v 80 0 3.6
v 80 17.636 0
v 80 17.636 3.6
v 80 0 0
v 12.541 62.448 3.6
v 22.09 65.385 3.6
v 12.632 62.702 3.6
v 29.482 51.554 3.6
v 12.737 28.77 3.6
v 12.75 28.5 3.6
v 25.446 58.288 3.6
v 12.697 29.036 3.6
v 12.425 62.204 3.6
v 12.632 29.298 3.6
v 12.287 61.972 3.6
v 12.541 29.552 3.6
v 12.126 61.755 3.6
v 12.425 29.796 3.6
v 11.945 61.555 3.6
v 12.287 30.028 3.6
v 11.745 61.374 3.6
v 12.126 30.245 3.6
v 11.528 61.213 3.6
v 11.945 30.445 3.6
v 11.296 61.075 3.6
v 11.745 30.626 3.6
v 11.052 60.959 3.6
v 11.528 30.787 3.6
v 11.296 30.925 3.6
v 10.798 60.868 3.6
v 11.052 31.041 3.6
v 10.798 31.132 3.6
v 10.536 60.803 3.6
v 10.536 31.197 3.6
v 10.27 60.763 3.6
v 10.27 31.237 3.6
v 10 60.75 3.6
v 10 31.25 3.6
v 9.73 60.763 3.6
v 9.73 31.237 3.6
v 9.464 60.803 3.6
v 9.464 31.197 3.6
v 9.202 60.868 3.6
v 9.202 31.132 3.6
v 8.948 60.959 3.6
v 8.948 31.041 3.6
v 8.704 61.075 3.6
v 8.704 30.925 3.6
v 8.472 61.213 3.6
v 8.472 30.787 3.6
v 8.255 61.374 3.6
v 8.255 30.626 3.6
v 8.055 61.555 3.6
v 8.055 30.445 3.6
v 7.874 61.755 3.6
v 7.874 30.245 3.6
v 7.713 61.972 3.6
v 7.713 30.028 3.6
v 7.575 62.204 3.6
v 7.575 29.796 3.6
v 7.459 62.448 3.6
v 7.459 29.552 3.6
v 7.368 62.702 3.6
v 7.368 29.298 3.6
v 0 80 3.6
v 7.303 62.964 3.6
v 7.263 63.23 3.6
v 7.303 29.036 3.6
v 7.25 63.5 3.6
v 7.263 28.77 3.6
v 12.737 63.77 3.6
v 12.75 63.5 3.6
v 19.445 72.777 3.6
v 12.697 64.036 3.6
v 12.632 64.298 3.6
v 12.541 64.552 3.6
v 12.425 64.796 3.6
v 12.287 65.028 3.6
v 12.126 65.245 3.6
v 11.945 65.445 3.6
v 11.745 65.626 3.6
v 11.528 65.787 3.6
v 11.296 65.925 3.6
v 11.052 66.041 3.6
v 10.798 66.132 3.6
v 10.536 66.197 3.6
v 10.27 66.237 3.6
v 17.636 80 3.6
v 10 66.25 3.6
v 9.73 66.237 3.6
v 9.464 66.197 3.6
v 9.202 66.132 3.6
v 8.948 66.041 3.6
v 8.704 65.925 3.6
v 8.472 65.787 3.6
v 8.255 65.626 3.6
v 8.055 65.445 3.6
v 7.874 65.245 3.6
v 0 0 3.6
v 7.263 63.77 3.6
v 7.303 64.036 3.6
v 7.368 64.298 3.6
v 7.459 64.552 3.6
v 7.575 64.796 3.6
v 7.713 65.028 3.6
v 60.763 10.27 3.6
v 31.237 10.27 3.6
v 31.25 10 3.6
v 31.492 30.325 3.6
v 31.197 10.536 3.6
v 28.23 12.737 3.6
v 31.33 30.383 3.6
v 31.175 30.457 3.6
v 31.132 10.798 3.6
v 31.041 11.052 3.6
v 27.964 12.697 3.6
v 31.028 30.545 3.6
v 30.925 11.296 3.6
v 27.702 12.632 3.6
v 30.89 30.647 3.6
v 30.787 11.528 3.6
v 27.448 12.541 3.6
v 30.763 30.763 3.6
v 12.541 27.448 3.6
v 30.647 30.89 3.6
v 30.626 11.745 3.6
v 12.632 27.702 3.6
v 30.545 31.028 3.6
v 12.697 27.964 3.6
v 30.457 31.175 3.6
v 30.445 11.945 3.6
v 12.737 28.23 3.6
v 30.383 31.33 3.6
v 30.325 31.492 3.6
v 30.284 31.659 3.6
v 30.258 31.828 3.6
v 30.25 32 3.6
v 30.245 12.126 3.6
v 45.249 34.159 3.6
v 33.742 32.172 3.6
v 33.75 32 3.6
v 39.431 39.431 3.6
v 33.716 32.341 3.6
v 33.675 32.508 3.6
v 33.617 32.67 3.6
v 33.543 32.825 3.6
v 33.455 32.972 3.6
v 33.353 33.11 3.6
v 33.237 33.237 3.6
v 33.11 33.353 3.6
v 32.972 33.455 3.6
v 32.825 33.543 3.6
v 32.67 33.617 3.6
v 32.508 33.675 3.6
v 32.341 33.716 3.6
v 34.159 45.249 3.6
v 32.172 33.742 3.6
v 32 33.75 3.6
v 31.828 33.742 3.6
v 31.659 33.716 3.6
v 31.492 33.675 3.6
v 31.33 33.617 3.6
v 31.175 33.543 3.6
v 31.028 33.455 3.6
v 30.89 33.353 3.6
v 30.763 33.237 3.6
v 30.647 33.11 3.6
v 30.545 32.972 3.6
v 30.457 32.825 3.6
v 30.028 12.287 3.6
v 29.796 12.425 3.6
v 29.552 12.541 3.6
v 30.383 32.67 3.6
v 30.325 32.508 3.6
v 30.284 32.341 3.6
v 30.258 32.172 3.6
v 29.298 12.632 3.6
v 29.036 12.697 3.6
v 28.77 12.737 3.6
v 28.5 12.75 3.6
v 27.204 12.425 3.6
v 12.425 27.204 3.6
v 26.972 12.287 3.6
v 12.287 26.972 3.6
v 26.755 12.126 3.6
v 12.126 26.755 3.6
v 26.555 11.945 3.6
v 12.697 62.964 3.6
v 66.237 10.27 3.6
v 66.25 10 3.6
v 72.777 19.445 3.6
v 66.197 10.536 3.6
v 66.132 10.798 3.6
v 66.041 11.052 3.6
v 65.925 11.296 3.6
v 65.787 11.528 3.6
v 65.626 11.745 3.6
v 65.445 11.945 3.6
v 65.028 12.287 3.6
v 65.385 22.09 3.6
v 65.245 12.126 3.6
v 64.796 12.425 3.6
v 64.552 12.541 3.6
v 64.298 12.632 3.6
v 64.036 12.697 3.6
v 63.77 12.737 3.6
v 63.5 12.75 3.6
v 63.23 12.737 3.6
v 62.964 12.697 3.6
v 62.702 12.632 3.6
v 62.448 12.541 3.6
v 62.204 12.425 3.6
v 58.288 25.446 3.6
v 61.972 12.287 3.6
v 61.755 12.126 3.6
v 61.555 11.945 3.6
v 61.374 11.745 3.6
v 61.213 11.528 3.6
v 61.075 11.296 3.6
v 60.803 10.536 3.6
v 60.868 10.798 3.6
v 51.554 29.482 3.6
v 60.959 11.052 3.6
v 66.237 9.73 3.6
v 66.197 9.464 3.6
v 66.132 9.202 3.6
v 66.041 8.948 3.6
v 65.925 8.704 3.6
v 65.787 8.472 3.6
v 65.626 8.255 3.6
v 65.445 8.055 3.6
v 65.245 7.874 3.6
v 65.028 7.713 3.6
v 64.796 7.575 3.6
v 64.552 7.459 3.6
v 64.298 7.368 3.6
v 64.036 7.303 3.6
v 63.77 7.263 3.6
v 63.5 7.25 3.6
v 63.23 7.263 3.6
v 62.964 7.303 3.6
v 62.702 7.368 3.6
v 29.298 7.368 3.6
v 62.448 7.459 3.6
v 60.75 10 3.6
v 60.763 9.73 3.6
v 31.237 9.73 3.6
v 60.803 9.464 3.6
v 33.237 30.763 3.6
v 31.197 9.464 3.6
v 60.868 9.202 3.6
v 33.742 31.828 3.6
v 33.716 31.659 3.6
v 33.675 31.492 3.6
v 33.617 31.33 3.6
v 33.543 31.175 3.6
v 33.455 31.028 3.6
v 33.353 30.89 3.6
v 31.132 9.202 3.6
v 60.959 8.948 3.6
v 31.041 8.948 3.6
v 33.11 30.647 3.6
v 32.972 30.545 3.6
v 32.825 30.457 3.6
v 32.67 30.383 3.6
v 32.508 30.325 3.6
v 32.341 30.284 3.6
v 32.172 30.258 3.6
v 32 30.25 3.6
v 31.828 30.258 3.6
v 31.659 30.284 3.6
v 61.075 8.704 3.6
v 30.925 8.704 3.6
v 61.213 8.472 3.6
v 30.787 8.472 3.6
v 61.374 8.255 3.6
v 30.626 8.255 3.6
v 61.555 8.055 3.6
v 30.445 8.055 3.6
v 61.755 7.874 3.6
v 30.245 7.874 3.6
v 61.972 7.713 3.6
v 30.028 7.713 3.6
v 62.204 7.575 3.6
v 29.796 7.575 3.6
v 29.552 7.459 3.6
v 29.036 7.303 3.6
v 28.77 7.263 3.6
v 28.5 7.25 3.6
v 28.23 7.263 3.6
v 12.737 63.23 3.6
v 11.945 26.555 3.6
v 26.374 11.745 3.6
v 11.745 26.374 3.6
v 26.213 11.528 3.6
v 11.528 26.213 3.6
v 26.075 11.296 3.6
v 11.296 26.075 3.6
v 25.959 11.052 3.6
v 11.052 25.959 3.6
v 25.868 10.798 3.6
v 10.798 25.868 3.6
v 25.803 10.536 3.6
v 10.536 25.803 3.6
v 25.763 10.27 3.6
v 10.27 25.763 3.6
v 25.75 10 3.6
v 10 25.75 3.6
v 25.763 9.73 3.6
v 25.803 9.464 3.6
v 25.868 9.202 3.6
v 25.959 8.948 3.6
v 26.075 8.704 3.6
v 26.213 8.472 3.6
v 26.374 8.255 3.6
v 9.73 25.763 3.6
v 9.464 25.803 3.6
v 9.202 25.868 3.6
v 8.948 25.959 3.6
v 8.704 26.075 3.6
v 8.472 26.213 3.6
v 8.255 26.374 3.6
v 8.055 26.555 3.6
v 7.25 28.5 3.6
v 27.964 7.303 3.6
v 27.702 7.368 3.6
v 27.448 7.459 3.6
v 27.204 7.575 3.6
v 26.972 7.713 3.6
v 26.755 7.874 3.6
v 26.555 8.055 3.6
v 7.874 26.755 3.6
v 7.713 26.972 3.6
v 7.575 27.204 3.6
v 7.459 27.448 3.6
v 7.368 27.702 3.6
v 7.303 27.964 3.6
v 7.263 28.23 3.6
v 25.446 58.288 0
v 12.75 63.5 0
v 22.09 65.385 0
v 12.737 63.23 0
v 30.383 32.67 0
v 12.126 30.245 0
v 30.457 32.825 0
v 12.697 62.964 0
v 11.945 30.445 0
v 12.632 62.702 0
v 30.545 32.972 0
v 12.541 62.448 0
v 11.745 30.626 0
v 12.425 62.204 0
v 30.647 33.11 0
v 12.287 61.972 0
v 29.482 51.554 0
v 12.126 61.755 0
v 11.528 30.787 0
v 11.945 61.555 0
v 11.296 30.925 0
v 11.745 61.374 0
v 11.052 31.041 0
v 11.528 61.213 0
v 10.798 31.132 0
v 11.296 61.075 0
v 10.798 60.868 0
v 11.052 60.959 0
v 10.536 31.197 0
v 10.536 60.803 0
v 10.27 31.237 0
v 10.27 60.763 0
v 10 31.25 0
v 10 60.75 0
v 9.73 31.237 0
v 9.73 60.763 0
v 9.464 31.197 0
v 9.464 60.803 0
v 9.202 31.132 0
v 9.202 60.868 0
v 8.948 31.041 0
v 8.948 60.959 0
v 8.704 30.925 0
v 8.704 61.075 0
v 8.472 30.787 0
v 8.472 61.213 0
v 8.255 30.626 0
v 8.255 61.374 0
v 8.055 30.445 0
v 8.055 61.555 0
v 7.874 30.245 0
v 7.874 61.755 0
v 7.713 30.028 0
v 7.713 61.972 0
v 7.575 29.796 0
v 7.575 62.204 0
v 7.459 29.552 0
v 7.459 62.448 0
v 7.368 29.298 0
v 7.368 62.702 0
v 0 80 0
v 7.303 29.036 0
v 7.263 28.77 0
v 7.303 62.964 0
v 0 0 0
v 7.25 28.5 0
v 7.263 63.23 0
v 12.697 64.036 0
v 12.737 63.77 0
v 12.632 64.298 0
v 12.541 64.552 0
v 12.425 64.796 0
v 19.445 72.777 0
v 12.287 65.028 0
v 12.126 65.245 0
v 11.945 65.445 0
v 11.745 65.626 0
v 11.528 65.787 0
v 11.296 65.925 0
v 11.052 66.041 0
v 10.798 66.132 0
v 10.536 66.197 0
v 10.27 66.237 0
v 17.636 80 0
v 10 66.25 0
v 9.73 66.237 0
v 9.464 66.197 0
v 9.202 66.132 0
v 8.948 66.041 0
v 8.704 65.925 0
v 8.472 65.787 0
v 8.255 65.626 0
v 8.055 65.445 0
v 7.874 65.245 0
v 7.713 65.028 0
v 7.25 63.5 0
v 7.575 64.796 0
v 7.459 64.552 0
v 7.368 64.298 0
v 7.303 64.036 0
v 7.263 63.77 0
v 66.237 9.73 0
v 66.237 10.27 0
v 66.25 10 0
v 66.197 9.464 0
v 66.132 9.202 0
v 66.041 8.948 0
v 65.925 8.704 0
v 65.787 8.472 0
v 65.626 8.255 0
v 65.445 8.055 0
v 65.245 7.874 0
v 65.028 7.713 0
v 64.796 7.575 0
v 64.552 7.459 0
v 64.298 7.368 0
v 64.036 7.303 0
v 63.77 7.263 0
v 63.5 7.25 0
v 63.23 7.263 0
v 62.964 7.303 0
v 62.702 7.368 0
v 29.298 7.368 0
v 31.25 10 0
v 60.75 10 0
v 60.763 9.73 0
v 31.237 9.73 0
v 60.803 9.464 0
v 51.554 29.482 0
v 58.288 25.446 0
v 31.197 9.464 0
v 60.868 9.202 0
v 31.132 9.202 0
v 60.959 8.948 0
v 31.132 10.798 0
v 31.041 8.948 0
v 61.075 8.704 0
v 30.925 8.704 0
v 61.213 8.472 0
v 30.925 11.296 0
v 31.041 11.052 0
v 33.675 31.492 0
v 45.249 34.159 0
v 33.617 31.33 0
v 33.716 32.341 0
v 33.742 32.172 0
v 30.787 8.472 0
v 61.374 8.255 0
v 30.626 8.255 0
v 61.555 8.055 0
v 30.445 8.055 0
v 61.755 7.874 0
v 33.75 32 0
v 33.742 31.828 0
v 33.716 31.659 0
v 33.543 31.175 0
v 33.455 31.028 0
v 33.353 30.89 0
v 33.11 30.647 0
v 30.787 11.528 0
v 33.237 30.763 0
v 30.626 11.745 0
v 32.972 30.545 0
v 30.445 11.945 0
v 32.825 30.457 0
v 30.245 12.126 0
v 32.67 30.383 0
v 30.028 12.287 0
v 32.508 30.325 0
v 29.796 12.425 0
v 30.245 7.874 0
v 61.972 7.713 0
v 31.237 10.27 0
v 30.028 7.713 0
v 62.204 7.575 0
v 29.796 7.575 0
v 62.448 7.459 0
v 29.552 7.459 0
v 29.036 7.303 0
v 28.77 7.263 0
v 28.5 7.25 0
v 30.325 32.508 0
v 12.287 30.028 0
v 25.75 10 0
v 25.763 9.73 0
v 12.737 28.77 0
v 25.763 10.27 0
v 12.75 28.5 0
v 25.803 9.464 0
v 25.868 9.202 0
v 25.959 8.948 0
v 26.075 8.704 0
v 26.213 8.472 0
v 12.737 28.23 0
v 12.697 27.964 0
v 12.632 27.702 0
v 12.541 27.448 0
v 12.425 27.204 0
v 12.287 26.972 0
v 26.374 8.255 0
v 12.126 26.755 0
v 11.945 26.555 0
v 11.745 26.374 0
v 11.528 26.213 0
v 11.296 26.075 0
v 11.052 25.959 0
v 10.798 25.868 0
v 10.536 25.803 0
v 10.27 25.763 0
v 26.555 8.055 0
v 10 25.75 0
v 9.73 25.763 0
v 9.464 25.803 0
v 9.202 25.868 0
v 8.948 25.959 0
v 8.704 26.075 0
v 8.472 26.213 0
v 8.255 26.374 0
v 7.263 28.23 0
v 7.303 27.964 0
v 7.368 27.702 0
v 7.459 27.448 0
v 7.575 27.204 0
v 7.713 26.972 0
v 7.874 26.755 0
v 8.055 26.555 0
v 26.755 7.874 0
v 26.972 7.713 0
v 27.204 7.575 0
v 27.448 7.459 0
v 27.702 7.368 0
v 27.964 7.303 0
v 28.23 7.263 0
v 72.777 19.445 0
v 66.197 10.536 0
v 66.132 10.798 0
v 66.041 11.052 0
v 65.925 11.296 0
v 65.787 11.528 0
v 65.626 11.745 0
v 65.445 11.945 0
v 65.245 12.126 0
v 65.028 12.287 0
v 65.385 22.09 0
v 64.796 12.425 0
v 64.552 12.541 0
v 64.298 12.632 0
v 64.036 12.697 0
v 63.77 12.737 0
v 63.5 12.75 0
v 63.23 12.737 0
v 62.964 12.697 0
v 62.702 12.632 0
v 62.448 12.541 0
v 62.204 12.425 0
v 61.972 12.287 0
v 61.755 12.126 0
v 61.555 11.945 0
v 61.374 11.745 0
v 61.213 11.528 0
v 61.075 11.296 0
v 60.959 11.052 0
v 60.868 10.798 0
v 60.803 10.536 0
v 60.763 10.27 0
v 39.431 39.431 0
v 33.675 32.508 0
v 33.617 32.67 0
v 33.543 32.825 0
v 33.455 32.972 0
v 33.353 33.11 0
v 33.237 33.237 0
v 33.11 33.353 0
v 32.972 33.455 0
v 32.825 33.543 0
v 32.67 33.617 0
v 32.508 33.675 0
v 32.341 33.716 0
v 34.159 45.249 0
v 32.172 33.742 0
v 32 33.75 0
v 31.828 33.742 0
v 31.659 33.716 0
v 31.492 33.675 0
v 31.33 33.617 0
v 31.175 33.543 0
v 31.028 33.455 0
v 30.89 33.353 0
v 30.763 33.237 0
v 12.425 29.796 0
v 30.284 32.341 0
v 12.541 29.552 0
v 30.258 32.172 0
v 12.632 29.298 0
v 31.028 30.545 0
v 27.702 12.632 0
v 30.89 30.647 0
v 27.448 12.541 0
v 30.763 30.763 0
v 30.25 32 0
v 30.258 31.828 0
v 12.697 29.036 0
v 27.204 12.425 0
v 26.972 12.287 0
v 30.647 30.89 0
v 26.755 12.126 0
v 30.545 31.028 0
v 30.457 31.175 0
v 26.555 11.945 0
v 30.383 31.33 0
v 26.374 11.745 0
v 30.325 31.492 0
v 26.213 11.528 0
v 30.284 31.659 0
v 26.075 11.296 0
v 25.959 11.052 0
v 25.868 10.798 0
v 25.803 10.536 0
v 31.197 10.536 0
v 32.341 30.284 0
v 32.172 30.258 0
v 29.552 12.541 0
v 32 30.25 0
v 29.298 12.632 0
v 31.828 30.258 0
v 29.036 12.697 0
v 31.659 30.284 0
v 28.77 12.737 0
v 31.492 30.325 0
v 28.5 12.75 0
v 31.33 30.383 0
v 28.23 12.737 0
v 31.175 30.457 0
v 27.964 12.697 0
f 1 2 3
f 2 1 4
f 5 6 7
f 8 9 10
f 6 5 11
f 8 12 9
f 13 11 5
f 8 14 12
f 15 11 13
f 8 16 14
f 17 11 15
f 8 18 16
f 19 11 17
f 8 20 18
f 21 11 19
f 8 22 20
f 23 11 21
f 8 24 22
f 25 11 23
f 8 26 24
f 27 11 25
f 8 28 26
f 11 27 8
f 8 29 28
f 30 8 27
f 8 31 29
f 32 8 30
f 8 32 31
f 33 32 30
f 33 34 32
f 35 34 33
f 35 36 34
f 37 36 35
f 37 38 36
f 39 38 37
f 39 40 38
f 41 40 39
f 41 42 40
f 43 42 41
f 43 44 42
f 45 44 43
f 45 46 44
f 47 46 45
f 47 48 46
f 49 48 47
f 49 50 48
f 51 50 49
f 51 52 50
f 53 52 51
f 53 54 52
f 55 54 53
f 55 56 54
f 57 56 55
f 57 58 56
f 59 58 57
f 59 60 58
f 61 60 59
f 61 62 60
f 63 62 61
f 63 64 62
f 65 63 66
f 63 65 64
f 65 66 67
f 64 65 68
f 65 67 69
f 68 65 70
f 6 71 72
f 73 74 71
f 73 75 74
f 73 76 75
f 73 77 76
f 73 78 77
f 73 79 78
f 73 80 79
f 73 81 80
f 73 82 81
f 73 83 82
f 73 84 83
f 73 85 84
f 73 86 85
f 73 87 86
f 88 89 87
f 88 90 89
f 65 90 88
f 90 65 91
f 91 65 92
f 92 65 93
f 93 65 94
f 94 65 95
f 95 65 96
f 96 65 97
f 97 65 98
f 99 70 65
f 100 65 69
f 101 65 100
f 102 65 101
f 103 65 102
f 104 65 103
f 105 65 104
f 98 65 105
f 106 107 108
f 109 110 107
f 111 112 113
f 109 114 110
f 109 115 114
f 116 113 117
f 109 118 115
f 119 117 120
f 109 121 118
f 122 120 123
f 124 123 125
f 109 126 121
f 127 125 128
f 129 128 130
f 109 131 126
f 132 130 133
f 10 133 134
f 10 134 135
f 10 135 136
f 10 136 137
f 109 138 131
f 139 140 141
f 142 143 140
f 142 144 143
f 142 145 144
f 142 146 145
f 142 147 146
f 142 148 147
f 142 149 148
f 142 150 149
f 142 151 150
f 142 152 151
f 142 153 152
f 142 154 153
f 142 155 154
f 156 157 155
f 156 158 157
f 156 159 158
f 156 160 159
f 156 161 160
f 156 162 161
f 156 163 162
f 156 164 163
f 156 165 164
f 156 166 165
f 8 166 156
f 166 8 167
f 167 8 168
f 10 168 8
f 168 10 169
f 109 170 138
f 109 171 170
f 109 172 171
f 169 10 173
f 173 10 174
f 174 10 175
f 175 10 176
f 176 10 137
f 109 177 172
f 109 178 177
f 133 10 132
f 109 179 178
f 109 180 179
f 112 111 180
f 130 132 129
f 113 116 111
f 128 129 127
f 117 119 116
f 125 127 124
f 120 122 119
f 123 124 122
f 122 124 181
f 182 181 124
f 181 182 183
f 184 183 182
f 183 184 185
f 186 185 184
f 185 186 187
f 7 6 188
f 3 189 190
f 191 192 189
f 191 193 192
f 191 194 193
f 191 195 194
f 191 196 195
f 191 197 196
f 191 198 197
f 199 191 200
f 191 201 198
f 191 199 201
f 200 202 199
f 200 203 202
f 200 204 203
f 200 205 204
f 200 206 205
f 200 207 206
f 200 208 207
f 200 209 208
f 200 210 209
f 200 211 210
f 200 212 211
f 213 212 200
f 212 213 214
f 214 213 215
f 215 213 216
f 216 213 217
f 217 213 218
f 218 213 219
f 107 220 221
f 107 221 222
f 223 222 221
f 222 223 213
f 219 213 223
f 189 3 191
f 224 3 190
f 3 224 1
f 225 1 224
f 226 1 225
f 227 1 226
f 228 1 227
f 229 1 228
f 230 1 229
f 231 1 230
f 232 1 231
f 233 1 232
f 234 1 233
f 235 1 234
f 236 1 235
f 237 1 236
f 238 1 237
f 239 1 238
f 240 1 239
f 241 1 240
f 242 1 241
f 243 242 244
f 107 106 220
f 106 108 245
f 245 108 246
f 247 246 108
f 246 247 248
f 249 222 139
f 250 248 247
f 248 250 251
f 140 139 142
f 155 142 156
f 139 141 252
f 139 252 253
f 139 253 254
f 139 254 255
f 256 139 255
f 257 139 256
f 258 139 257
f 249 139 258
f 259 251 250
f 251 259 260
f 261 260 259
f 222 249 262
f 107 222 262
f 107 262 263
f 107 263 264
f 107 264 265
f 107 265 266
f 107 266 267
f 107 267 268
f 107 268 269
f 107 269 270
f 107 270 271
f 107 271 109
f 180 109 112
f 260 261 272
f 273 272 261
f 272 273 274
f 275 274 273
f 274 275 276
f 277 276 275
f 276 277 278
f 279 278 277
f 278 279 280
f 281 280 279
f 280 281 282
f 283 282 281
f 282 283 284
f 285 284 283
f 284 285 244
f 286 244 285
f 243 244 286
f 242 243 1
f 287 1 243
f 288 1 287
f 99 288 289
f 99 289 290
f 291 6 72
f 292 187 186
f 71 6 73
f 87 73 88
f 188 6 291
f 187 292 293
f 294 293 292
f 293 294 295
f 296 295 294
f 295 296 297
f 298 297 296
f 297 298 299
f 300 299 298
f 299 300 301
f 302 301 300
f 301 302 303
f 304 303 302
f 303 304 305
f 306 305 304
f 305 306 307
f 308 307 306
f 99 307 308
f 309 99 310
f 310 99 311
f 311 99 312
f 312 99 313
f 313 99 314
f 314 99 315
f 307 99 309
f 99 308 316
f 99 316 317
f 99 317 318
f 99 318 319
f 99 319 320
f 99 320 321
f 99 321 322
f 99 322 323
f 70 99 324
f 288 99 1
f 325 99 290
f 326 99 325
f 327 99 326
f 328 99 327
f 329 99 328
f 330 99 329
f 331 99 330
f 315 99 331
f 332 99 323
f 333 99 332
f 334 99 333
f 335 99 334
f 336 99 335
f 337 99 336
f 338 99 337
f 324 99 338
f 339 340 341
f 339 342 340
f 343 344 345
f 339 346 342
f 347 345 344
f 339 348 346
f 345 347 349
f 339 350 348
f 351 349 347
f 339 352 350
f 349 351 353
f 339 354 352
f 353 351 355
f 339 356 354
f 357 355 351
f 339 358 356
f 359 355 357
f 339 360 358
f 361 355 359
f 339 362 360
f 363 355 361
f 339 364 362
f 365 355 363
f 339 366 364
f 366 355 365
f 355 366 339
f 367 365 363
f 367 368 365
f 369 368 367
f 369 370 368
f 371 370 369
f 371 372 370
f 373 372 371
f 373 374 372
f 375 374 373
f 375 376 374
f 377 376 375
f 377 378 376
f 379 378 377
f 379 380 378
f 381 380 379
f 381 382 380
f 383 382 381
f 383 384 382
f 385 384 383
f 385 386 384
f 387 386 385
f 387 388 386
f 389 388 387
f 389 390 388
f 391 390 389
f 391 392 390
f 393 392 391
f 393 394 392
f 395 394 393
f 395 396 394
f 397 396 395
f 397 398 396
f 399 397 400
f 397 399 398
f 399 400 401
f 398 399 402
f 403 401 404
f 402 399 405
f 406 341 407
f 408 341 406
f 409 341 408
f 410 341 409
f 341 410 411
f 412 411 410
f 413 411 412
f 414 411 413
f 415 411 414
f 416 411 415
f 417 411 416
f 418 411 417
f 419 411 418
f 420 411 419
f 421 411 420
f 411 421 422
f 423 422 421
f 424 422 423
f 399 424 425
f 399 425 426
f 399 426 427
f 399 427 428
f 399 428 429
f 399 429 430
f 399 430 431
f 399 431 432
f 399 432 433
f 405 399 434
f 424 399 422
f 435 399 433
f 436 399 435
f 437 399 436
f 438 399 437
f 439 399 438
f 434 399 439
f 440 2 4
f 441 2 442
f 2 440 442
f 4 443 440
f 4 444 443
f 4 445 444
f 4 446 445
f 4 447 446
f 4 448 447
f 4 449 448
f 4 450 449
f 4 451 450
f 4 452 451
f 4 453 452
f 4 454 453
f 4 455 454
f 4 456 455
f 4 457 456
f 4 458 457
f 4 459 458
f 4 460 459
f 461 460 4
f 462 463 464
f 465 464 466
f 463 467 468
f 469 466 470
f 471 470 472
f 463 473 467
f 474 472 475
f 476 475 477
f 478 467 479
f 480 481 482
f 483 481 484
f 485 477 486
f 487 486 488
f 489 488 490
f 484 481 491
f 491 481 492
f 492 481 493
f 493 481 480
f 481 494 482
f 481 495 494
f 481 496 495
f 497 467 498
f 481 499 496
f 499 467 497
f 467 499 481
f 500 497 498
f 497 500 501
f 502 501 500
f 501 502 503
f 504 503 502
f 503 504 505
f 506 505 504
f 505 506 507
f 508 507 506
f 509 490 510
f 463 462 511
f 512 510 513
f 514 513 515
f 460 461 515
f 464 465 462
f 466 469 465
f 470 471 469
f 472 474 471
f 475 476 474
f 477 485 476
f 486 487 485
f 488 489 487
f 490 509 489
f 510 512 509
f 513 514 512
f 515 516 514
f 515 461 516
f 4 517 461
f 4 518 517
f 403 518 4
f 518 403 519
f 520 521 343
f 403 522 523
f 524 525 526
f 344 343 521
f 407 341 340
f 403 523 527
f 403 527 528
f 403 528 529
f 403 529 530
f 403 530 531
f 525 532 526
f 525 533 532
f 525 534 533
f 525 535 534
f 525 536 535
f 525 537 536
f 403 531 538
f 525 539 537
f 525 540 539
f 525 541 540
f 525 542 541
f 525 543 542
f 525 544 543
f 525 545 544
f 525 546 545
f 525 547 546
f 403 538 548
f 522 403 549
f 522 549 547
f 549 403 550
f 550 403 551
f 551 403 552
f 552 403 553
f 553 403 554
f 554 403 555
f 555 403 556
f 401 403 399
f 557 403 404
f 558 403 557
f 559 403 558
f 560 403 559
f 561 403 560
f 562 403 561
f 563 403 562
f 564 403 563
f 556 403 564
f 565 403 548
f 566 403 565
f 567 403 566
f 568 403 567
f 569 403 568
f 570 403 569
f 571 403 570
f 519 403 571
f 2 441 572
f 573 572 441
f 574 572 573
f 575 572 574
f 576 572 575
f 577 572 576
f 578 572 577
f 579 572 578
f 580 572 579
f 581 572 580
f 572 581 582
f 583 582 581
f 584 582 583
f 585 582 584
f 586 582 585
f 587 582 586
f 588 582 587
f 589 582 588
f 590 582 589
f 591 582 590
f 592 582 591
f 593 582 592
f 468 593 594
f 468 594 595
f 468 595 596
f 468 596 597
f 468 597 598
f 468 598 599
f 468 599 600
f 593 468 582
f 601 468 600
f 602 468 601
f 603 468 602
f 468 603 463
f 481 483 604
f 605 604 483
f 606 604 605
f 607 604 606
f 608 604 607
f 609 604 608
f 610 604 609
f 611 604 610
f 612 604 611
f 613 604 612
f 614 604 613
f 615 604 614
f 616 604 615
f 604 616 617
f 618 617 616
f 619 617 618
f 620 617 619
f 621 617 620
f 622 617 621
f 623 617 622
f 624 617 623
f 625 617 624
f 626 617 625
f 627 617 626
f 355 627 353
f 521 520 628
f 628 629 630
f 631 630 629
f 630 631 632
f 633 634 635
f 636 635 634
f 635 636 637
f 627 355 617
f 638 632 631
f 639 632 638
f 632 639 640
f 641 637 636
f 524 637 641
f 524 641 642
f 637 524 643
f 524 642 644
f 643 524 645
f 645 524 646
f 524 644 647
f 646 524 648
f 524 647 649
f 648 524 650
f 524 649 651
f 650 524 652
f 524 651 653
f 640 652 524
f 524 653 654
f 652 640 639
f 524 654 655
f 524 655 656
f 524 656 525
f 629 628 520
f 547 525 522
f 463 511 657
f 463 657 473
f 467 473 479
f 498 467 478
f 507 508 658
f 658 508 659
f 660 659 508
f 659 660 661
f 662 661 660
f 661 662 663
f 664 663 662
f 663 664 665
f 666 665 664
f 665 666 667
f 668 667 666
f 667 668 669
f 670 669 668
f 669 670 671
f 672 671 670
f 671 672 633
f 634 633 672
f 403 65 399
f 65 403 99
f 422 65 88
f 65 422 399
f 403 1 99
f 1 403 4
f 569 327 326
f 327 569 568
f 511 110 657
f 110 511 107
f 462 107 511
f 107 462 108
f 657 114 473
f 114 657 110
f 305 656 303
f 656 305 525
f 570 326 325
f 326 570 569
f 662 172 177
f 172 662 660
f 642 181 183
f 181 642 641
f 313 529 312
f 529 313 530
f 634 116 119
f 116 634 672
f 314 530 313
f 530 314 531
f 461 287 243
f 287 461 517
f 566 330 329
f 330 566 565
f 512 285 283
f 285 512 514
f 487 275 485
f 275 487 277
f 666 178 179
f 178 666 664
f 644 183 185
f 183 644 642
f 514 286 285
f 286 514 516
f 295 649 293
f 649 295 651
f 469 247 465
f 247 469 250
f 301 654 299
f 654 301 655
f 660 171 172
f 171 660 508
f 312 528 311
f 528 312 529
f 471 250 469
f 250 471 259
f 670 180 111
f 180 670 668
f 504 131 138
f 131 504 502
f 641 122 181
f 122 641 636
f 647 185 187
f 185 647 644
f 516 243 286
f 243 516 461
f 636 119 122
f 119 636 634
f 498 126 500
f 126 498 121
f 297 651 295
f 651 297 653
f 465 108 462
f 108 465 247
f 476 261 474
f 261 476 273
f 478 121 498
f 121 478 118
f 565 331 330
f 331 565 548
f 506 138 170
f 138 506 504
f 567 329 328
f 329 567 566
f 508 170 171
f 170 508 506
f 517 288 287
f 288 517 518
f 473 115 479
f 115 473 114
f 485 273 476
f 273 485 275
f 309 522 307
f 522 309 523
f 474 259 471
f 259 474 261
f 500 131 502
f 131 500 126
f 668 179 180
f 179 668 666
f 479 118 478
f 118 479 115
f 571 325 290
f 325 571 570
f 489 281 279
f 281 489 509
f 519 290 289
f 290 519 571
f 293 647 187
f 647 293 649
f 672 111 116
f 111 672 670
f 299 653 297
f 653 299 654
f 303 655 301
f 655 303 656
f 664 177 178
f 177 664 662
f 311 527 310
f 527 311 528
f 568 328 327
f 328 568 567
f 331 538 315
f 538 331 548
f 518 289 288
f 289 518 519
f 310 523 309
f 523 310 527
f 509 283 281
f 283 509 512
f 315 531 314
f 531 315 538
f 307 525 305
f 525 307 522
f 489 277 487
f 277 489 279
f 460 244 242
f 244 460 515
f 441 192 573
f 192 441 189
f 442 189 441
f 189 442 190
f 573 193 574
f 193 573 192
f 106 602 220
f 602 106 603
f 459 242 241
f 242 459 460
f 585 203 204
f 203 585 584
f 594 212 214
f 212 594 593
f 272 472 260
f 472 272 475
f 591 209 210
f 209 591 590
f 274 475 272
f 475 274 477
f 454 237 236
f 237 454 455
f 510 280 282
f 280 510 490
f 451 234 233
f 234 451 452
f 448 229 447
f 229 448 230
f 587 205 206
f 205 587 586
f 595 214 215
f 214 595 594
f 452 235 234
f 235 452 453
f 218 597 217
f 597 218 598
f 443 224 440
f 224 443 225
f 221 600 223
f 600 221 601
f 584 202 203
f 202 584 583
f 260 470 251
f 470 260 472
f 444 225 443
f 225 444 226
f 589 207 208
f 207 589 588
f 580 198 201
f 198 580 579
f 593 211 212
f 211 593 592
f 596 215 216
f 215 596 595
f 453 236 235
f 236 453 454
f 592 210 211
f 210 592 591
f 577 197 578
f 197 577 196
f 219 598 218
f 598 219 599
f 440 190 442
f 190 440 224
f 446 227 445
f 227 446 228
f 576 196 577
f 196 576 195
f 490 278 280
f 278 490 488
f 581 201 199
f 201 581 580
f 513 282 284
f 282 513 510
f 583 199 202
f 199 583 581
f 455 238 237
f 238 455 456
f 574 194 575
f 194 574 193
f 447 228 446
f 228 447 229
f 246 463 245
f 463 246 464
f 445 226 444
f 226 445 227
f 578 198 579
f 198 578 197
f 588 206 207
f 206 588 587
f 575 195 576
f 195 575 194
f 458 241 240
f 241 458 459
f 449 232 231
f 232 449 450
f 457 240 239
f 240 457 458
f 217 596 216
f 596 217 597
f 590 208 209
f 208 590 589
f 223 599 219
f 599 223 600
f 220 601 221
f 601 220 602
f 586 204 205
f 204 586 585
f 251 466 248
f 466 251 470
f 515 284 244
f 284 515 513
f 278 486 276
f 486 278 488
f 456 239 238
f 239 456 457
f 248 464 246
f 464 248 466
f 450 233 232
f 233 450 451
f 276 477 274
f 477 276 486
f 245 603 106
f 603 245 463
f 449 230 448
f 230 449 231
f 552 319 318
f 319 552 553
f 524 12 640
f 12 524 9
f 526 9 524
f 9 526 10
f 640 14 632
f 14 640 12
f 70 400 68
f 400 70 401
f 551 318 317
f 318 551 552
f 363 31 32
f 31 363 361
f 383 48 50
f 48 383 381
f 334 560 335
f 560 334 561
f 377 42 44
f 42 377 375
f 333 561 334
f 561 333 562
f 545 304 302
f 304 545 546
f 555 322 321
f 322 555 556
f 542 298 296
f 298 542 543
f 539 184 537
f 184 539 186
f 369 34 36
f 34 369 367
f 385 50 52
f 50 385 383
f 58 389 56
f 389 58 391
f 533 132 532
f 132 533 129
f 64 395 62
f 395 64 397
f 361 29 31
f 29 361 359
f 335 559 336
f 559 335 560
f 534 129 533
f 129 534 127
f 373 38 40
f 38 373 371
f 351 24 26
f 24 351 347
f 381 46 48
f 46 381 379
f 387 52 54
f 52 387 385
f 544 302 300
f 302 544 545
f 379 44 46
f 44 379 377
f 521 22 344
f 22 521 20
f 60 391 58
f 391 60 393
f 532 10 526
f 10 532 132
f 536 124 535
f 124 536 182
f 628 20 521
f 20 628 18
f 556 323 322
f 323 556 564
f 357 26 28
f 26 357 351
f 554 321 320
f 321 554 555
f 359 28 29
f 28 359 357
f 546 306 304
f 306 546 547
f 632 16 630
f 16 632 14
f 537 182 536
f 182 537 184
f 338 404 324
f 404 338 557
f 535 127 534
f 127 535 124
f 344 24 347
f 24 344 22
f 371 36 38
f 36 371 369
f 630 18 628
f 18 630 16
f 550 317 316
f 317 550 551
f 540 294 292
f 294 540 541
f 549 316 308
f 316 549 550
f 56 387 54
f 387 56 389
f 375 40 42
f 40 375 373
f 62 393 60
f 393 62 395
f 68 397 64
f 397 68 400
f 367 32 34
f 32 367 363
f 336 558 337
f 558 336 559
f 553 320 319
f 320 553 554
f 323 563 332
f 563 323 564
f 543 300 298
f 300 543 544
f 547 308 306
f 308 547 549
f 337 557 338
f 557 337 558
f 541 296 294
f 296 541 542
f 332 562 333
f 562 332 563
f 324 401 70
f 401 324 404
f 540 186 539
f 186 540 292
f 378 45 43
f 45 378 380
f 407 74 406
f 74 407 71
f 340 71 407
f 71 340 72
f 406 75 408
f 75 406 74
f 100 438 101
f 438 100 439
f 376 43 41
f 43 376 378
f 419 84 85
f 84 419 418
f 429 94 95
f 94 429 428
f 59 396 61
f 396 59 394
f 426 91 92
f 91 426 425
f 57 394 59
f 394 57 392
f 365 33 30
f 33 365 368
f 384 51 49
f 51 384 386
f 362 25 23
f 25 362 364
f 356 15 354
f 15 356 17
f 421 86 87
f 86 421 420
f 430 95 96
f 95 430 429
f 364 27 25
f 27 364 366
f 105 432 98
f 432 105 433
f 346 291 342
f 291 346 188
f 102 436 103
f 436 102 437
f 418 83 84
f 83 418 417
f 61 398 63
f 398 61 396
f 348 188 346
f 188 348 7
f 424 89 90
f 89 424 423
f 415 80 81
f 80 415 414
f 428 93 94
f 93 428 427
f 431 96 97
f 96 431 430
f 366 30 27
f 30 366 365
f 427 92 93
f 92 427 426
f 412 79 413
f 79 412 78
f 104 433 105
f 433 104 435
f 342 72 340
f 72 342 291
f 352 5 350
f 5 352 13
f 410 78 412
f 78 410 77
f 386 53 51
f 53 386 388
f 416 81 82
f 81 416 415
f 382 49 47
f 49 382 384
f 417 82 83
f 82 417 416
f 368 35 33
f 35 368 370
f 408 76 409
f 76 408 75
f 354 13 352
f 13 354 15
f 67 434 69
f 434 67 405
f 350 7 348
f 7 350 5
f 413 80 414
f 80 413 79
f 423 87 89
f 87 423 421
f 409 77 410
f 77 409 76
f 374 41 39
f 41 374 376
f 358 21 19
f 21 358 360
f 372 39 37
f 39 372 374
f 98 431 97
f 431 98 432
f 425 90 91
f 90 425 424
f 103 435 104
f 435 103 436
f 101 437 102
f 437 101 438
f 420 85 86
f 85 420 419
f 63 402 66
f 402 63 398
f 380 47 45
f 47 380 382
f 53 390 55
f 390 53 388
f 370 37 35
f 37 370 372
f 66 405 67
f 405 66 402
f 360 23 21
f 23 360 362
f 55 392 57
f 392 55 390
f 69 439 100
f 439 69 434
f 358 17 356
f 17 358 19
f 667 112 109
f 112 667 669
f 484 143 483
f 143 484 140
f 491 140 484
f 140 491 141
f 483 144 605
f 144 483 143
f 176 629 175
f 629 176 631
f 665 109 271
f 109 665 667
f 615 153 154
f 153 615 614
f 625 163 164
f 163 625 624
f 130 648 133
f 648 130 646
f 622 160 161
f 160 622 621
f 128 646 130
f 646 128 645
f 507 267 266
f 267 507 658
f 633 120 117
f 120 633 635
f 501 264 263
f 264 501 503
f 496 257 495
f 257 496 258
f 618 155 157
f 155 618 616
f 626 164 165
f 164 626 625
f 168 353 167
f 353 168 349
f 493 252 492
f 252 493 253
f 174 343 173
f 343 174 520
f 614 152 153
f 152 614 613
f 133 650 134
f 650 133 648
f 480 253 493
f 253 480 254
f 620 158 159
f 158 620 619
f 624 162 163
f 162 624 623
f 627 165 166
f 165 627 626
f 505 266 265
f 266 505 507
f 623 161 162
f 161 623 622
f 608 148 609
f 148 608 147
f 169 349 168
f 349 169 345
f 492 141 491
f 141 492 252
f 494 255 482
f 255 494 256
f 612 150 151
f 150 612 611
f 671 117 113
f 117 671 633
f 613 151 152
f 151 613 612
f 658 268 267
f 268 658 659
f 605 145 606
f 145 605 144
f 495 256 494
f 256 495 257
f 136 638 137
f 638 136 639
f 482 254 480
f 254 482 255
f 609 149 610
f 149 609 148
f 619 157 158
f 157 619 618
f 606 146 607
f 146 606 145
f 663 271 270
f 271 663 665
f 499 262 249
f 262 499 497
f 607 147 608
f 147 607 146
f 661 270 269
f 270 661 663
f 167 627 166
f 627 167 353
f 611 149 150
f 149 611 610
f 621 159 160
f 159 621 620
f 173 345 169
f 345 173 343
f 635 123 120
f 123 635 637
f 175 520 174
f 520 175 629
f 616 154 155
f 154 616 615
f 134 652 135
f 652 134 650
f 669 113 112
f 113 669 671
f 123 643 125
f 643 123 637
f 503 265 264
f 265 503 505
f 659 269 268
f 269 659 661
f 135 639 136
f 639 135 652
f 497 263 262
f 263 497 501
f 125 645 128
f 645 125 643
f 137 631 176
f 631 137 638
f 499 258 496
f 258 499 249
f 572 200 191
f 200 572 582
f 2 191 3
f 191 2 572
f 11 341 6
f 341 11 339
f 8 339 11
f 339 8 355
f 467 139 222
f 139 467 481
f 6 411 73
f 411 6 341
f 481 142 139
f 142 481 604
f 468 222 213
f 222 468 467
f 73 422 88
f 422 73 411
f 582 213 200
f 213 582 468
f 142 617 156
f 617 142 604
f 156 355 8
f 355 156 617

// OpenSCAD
// file: ../sc.scad
// ShortCuts.scad 
// Autor: Rudolf Huttary, Berlin 2015
//
$fn = 100; 

//show_examples(); 

module show_examples()
	place_in_rect(30, 30)
	{
		Cy(h = 10); 
		CyH(h = 10); 
		CyH(h = 10, w = 30); 
		CyS(h = 10); 
		CyS(h = 10, w1 = 25, w2 = 75); 
		Cu(10); 
		Ri(h = 10); 
		RiH(h = 10); 
		RiS(h = 10, w1 = 10); 
		RiS(h = 10, w1 = 30, w2 = 300); 
		Sp(); 
		SpH(10, 30, 30); 
	}


module help()
{
echo("==============="); 
echo("help(): shows this help"); 
echo("show_examples(): shows some examples"); 
echo("place_in_rect(): places children objects in grid"); 
echo("Transformations:"); 
echo(" transform :  T(x=0, y=0, z=0), Tx(x=0) , Ty(y=0), Tz(z=0)"); 
echo(" rotate :  R(x=0, y=0, z=0), Rx(x=0) , Ry(y=0), Rz(z=0)"); 
echo(" scale :  S(x=1, y=1, z=1), Sx(x=1) , Sy(y=1), Sz(z=1)"); 
echo("Logical"); 
echo(" difference :  D()"); 
echo(" union :  U()"); 
echo(" intersection : *missing*"); 
echo("Primitives"); 
echo(" circle :  Ci(r=10)"); 
echo(" circle_half :  CiH(r=10, w=0)")
echo(" circle_segment :  CiS(r=10, w1=0, w2=90)")
echo(" square :  Sq(x=10, y=0, center=true))"); 
echo(" cylinder :  Cy(r=10, h=1, center=true)"); 
echo(" cylinder_half :  CyH(r=10, w=0)")
echo(" cylinder_segment: CyS(r=10, h=1, w1=0, w2=90,center=true)"); 
echo(" cylinder_segment: Pie(r=10, h=1, w1=0, w2=90,center=true)"); 
echo(" cube :  Cu(x=10, y=0, z=10, center=true)"); 
echo(" ring :  Ri(R=10, r=5, h=1, center=true)"); 
echo(" ring_half :  RiH(R=10, r=5, h=1, w=0 center=true)"); 
echo(" ring_segment :  RiS(R=10, r=5, h=1, w1=0, w2=90, center=true)"); 
echo(" sphere:  Sp(r=10))"); 
echo(" sphere_half:  SpH(r=10, w1 = 0, w2 = 0))"); 
echo("==============="); 
}

// Euclidean Transformations
module T(x=0, y=0, z=0){translate([x, y, z])children(); }
module Tx(x) { translate([x, 0, 0])children(); }
module Ty(y) { translate([0, y, 0])children(); }
module Tz(z) { translate([0, 0, z])children(); }

module R(x=0, y=0, z=0){rotate([x, y, z]) children();}
module Rx(x=90){rotate([x, 0, 0]) children();}
module Ry(y=90){rotate([0, y, 0]) children();}
module Rz(z=90){rotate([0, 0, z]) children();}

module M(x=0, y=0, z=0){mirror([x, y, z]) children();}
module Mx(x=1){mirror([x, 0, 0]) children();}
module My(y=1){mirror([0, y, 0]) children();}
module Mz(z=1){mirror([0, 0, z]) children();}

module S(x=1, y=1, z=1){scale([x, y, z]) children();}
module Sx(x=1){scale([x, 1, 1]) children();}
module Sy(y=1){scale([1, y, 1]) children();}
module Sz(z=1){scale([1, 1, z]) children();}

module D() difference(){children(0); children([1:$children-1]);}
module U() children([0:$children-1]);
// module I() intersection()children([0:$children-1]); // does not work for some reason


// primitives - 2D

module Sq(x =10, y = 0, center = false)
{
   if(y==0)
		square([x, x], center = center); 
	else
		square([x, y], center = center); 
}
module Ci(r = 10)
{
	circle(r = r); 
}

// derived primitives - 2d
module CiH(r = 10, w = 0)
  circle_half(r, w); 

module CiS(r = 10, w1 = 0, w2 = 90)
  circle_segment(r, w1, w2); 


// primitives - 3d
module Cy(r = 10, h = 1, center = false)
{
	cylinder(r = r, h = h, center = center); 
}
module Cu(x = 10, y = 0, z = 10, center = false)
{
  if (y==0)
	cube([x, x, x], center = center); 
  else
	cube([x, y, z], center = center); 
}

// derived primitives - 3d
module CyH(r = 10, h = 1, w = 0, center = false)
  cylinder_half(r, h, w, center); 

module CyS(r = 10, h = 1, w1 = 0, w2 = 90, center = false)
  cylinder_segment(r, h, w1, w2, center); 

module Ri(R = 10, r = 5, h = 1, center = false)
  ring(R, r, h, center); 

module RiS(R = 10, r = 5, h = 1, w1 = 0, w2 = 90, center = false)
   ring_segment(R, r, h, w1, w2, center); 

module RiH(r1 = 10, r2, h = 1, w = 0, center = false)
   ring_half(r1, r2, h, w, center); 
module Pie(r = 10, h = 1, w1 = 0, w2 = 90, center = false)
  cylinder_segment(r, h, w1, w2, center);  
module Sp(r = 10)
  sphere(r); 
module SpH(r = 10, w1 = 0, w2 = 0)
  sphere_half(r, w1, w2); 
module SpS(r = 10, w1 = 0, w2 = 90, w3 = 90)
  sphere_segment(r, w1, w2); 




// clear text definitions
module circle_half(r = 10, w = 0)
{
	difference()
	{
		circle(r); 
     rotate([0, 0, w-90])
     translate([0, -r])
		square([r, 2*r], center = false); 
	}
}

module circle_segment(r = 10, w1 = 0, w2 = 90)
{
  W2 = (w1>w2)?w2+360:w2; 
  if (W2-w1 < 180)
    intersection()
		{
       circle_half(r, w1); 
       circle_half(r, W2-180); 
 		}
	else
    union()
		{
       circle_half(r, w1); 
       circle_half(r, W2-180); 
 		}
}

module cylinder_half(r = 10, h = 1, w = 0, center = true)
{
  linear_extrude(height = h, center = center)
  circle_half(r, w); 
} 

module cylinder_segment(r = 10, h = 1, w1 = 0, w2 = 90, center = true)
{
  linear_extrude(height = h, center = center)
  circle_segment(r, w1, w2); 
} 

module ring(R = 10, r = 5, h = 1, center = true)
{
	difference()
	{
	cylinder(r = R, h = h, center = center); 
   translate([0, 0, -2*h])
	cylinder(r = r, h = 4*h, center = false); 
	}
}

module ring_half(R = 10, r = 5, h = 1, w = 0, center = true)
{
	difference()
	{
		ring(R, r, h, center); 
     rotate([0, 0, w])
     translate([0, -R/2, 0])
		cube([2*R, R, 3*h], center = true); 
	}
}

module ring_segment(R = 10, r = 5, h = 1, w1 = 0, w2 = 90, center = true)
{
  W2 = (w1>w2)?w2+360:w2; 
  if (W2-w1 < 180)
    intersection()
		{
       ring_half(R, r, h, w1, center); 
       ring_half(R, r, h, W2-180, center); 
 		}
	else
    union()
		{
       ring_half(R, r, h, w1, center); 
       ring_half(R, r, h, W2-180, center); 
 		}
}


module sphere_half(r = 10, w1 = 0, w2 = 0)
{  
	difference()
	{
   	sphere(r); 
      rotate([-w1, -w2, 0])
     	translate([0, 0, r])
		cube([2*r, 2*r, r], center = true); 
	}

}


// additional code
module place_in_rect(dx =20, dy=20)
{
  cols = ceil(sqrt($children)); 
  rows = floor(sqrt($children)); 
  for(i = [0:$children-1])
	{ 
	  T(dx*(-cols/2+(i%cols)+.5), dy*(rows/2-floor(i/cols)-.5))
		 children(i); 
	}
}
// main file
use <../lib.scad>
$fn=64;

lineHeigth=0.20;
lineWidth=0.80;

width=80;
length=80;
height=3.5;
thickxy=20;
thickz=1.2;


/************************************/
w=multiple(width, lineWidth);
l=multiple(length, lineWidth);
h=multiple(height, lineHeigth);
txy=multiple(thickxy, lineWidth);
tz=multiple(thickz, lineHeigth);


difference(){
    union(){ 
        difference(){
            cube([w,l,h]);

            //translate([20,20,-.1]) 
            translate([w,20,-.1]) rotate([0,0,45])
            cube([w,l+5,h+1]);
        }
        translate([0,60,0])
        rotate([0,0,-45])
        cube([w,txy,h]);
    }
    
    // X holes
    translate([28.5,10,-.1])
    cylinder(d=5.5, h=5);
    translate([63.5,10,-.1])
    cylinder(d=5.5, h=5);
    // Y holes
    translate([10,28.5,-.1])
    cylinder(d=5.5, h=5);
    translate([10,63.5,-.1])
    cylinder(d=5.5, h=5);
    
    // Support hole
    translate([l*0.4,w*0.4,-.1])
    cylinder(d=3.5, h=5);
    
    //
    translate([w*1.2,l*1.2,-.1])
    cylinder(d=w*2 , h=h+1);
}
